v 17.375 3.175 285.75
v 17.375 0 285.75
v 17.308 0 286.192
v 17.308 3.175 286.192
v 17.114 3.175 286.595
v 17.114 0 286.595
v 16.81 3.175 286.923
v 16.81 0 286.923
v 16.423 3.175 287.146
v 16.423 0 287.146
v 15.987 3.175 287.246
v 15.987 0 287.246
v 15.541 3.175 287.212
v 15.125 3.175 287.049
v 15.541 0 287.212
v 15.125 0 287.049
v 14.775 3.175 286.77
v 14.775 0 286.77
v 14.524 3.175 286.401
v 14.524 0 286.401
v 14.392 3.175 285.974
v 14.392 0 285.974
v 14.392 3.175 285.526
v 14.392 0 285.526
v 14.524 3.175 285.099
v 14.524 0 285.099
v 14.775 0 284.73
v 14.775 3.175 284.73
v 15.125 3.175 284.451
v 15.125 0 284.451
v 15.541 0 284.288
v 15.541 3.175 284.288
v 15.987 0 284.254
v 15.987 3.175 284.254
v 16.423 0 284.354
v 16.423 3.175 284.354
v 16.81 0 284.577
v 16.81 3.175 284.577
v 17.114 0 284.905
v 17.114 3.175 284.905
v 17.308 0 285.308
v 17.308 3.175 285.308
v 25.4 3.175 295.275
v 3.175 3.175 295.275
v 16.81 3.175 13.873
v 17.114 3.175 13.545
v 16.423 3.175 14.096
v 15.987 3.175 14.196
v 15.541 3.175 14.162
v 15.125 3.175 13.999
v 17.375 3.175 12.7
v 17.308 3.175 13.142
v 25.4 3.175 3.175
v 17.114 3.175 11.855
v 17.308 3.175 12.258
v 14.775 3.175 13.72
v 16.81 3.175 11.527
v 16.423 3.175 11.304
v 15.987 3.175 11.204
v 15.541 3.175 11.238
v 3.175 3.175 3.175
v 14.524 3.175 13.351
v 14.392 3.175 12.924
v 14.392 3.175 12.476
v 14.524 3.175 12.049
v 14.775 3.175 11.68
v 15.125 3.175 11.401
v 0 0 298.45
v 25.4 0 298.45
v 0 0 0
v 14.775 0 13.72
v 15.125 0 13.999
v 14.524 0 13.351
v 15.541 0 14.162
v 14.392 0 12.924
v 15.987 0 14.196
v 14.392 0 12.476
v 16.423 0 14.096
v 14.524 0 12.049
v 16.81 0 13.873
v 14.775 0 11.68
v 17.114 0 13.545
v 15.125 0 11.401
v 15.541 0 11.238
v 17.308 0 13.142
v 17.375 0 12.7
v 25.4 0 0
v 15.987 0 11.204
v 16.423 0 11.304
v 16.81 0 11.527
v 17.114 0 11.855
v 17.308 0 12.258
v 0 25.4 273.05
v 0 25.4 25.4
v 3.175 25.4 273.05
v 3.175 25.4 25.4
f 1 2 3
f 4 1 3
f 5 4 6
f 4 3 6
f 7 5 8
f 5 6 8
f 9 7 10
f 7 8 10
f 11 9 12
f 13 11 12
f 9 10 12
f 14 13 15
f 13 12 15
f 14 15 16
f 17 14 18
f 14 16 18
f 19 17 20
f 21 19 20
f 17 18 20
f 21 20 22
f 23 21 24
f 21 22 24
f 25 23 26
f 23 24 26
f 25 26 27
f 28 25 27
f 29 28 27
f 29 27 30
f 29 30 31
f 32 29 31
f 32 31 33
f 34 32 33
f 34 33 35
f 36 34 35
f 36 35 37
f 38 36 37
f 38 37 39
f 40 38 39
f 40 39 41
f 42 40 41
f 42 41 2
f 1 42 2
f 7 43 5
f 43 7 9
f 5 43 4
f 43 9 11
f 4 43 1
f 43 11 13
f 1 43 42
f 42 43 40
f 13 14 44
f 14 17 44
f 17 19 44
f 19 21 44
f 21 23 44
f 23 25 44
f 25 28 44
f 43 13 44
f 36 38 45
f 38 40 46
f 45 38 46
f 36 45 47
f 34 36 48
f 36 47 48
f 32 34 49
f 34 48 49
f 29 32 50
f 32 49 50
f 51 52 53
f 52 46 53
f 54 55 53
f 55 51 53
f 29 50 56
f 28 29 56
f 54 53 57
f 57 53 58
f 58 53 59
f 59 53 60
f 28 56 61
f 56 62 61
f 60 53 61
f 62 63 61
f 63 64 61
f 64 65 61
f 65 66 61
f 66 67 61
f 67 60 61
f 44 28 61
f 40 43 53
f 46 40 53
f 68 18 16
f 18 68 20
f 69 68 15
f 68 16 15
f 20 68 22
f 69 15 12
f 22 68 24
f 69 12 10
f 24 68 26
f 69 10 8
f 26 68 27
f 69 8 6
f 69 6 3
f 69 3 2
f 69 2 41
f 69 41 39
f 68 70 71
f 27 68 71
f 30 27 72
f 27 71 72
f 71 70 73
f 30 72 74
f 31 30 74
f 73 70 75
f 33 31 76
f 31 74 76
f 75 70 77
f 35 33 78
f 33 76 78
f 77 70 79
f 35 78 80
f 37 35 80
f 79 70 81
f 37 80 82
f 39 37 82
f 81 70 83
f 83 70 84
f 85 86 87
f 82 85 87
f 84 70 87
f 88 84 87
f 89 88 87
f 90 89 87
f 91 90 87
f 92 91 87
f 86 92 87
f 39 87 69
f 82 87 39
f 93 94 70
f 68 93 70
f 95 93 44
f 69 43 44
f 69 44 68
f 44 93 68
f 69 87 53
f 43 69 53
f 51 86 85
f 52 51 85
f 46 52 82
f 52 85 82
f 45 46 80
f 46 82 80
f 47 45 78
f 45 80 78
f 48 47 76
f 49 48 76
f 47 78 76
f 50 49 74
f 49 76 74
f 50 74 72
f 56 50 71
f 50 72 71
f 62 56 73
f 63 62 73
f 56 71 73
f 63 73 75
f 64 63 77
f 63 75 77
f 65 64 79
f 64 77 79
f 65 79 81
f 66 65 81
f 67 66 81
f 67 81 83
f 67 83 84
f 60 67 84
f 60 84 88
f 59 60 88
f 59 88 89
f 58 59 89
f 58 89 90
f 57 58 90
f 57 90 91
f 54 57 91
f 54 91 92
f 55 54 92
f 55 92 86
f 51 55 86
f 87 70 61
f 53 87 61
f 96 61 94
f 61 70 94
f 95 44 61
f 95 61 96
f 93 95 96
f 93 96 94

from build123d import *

# Parameters (mm, degrees)
BOSS_EXTRUDE1_DEPTH = 298.45
CUT_EXTRUDE1_DEPTH  = 711.2
SKETCH3_R           = 1.5
CUT_EXTRUDE2_DEPTH  = 711.2


with BuildPart() as part:
    # Sketch1 → Boss-Extrude1 (new body)
    with BuildSketch(Plane.XY):
        Polygon((0, 25.4), (0, 0), (25.4, 0), (25.4, 3.175), (3.175, 3.175), (3.175, 25.4), align=None)
    extrude(amount=BOSS_EXTRUDE1_DEPTH)

    # Sketch2 → Cut-Extrude1 (cut)
    with BuildSketch(Plane.ZY):
        Polygon((0, 8.542079309), (0, 0), (25.4, 25.4), (0, 25.4), align=None)
        Polygon((298.45, 25.4), (273.05, 25.4), (298.45, 0), align=None)
    extrude(amount=-CUT_EXTRUDE1_DEPTH, mode=Mode.SUBTRACT)

    # Sketch3 → Cut-Extrude2 (cut)
    with BuildSketch(Plane.XZ):
        with Locations((15.875, 285.75)):
            Circle(SKETCH3_R)
        with Locations((15.875, 12.7)):
            Circle(SKETCH3_R)
    extrude(amount=-CUT_EXTRUDE2_DEPTH, mode=Mode.SUBTRACT)


solid = part.part
